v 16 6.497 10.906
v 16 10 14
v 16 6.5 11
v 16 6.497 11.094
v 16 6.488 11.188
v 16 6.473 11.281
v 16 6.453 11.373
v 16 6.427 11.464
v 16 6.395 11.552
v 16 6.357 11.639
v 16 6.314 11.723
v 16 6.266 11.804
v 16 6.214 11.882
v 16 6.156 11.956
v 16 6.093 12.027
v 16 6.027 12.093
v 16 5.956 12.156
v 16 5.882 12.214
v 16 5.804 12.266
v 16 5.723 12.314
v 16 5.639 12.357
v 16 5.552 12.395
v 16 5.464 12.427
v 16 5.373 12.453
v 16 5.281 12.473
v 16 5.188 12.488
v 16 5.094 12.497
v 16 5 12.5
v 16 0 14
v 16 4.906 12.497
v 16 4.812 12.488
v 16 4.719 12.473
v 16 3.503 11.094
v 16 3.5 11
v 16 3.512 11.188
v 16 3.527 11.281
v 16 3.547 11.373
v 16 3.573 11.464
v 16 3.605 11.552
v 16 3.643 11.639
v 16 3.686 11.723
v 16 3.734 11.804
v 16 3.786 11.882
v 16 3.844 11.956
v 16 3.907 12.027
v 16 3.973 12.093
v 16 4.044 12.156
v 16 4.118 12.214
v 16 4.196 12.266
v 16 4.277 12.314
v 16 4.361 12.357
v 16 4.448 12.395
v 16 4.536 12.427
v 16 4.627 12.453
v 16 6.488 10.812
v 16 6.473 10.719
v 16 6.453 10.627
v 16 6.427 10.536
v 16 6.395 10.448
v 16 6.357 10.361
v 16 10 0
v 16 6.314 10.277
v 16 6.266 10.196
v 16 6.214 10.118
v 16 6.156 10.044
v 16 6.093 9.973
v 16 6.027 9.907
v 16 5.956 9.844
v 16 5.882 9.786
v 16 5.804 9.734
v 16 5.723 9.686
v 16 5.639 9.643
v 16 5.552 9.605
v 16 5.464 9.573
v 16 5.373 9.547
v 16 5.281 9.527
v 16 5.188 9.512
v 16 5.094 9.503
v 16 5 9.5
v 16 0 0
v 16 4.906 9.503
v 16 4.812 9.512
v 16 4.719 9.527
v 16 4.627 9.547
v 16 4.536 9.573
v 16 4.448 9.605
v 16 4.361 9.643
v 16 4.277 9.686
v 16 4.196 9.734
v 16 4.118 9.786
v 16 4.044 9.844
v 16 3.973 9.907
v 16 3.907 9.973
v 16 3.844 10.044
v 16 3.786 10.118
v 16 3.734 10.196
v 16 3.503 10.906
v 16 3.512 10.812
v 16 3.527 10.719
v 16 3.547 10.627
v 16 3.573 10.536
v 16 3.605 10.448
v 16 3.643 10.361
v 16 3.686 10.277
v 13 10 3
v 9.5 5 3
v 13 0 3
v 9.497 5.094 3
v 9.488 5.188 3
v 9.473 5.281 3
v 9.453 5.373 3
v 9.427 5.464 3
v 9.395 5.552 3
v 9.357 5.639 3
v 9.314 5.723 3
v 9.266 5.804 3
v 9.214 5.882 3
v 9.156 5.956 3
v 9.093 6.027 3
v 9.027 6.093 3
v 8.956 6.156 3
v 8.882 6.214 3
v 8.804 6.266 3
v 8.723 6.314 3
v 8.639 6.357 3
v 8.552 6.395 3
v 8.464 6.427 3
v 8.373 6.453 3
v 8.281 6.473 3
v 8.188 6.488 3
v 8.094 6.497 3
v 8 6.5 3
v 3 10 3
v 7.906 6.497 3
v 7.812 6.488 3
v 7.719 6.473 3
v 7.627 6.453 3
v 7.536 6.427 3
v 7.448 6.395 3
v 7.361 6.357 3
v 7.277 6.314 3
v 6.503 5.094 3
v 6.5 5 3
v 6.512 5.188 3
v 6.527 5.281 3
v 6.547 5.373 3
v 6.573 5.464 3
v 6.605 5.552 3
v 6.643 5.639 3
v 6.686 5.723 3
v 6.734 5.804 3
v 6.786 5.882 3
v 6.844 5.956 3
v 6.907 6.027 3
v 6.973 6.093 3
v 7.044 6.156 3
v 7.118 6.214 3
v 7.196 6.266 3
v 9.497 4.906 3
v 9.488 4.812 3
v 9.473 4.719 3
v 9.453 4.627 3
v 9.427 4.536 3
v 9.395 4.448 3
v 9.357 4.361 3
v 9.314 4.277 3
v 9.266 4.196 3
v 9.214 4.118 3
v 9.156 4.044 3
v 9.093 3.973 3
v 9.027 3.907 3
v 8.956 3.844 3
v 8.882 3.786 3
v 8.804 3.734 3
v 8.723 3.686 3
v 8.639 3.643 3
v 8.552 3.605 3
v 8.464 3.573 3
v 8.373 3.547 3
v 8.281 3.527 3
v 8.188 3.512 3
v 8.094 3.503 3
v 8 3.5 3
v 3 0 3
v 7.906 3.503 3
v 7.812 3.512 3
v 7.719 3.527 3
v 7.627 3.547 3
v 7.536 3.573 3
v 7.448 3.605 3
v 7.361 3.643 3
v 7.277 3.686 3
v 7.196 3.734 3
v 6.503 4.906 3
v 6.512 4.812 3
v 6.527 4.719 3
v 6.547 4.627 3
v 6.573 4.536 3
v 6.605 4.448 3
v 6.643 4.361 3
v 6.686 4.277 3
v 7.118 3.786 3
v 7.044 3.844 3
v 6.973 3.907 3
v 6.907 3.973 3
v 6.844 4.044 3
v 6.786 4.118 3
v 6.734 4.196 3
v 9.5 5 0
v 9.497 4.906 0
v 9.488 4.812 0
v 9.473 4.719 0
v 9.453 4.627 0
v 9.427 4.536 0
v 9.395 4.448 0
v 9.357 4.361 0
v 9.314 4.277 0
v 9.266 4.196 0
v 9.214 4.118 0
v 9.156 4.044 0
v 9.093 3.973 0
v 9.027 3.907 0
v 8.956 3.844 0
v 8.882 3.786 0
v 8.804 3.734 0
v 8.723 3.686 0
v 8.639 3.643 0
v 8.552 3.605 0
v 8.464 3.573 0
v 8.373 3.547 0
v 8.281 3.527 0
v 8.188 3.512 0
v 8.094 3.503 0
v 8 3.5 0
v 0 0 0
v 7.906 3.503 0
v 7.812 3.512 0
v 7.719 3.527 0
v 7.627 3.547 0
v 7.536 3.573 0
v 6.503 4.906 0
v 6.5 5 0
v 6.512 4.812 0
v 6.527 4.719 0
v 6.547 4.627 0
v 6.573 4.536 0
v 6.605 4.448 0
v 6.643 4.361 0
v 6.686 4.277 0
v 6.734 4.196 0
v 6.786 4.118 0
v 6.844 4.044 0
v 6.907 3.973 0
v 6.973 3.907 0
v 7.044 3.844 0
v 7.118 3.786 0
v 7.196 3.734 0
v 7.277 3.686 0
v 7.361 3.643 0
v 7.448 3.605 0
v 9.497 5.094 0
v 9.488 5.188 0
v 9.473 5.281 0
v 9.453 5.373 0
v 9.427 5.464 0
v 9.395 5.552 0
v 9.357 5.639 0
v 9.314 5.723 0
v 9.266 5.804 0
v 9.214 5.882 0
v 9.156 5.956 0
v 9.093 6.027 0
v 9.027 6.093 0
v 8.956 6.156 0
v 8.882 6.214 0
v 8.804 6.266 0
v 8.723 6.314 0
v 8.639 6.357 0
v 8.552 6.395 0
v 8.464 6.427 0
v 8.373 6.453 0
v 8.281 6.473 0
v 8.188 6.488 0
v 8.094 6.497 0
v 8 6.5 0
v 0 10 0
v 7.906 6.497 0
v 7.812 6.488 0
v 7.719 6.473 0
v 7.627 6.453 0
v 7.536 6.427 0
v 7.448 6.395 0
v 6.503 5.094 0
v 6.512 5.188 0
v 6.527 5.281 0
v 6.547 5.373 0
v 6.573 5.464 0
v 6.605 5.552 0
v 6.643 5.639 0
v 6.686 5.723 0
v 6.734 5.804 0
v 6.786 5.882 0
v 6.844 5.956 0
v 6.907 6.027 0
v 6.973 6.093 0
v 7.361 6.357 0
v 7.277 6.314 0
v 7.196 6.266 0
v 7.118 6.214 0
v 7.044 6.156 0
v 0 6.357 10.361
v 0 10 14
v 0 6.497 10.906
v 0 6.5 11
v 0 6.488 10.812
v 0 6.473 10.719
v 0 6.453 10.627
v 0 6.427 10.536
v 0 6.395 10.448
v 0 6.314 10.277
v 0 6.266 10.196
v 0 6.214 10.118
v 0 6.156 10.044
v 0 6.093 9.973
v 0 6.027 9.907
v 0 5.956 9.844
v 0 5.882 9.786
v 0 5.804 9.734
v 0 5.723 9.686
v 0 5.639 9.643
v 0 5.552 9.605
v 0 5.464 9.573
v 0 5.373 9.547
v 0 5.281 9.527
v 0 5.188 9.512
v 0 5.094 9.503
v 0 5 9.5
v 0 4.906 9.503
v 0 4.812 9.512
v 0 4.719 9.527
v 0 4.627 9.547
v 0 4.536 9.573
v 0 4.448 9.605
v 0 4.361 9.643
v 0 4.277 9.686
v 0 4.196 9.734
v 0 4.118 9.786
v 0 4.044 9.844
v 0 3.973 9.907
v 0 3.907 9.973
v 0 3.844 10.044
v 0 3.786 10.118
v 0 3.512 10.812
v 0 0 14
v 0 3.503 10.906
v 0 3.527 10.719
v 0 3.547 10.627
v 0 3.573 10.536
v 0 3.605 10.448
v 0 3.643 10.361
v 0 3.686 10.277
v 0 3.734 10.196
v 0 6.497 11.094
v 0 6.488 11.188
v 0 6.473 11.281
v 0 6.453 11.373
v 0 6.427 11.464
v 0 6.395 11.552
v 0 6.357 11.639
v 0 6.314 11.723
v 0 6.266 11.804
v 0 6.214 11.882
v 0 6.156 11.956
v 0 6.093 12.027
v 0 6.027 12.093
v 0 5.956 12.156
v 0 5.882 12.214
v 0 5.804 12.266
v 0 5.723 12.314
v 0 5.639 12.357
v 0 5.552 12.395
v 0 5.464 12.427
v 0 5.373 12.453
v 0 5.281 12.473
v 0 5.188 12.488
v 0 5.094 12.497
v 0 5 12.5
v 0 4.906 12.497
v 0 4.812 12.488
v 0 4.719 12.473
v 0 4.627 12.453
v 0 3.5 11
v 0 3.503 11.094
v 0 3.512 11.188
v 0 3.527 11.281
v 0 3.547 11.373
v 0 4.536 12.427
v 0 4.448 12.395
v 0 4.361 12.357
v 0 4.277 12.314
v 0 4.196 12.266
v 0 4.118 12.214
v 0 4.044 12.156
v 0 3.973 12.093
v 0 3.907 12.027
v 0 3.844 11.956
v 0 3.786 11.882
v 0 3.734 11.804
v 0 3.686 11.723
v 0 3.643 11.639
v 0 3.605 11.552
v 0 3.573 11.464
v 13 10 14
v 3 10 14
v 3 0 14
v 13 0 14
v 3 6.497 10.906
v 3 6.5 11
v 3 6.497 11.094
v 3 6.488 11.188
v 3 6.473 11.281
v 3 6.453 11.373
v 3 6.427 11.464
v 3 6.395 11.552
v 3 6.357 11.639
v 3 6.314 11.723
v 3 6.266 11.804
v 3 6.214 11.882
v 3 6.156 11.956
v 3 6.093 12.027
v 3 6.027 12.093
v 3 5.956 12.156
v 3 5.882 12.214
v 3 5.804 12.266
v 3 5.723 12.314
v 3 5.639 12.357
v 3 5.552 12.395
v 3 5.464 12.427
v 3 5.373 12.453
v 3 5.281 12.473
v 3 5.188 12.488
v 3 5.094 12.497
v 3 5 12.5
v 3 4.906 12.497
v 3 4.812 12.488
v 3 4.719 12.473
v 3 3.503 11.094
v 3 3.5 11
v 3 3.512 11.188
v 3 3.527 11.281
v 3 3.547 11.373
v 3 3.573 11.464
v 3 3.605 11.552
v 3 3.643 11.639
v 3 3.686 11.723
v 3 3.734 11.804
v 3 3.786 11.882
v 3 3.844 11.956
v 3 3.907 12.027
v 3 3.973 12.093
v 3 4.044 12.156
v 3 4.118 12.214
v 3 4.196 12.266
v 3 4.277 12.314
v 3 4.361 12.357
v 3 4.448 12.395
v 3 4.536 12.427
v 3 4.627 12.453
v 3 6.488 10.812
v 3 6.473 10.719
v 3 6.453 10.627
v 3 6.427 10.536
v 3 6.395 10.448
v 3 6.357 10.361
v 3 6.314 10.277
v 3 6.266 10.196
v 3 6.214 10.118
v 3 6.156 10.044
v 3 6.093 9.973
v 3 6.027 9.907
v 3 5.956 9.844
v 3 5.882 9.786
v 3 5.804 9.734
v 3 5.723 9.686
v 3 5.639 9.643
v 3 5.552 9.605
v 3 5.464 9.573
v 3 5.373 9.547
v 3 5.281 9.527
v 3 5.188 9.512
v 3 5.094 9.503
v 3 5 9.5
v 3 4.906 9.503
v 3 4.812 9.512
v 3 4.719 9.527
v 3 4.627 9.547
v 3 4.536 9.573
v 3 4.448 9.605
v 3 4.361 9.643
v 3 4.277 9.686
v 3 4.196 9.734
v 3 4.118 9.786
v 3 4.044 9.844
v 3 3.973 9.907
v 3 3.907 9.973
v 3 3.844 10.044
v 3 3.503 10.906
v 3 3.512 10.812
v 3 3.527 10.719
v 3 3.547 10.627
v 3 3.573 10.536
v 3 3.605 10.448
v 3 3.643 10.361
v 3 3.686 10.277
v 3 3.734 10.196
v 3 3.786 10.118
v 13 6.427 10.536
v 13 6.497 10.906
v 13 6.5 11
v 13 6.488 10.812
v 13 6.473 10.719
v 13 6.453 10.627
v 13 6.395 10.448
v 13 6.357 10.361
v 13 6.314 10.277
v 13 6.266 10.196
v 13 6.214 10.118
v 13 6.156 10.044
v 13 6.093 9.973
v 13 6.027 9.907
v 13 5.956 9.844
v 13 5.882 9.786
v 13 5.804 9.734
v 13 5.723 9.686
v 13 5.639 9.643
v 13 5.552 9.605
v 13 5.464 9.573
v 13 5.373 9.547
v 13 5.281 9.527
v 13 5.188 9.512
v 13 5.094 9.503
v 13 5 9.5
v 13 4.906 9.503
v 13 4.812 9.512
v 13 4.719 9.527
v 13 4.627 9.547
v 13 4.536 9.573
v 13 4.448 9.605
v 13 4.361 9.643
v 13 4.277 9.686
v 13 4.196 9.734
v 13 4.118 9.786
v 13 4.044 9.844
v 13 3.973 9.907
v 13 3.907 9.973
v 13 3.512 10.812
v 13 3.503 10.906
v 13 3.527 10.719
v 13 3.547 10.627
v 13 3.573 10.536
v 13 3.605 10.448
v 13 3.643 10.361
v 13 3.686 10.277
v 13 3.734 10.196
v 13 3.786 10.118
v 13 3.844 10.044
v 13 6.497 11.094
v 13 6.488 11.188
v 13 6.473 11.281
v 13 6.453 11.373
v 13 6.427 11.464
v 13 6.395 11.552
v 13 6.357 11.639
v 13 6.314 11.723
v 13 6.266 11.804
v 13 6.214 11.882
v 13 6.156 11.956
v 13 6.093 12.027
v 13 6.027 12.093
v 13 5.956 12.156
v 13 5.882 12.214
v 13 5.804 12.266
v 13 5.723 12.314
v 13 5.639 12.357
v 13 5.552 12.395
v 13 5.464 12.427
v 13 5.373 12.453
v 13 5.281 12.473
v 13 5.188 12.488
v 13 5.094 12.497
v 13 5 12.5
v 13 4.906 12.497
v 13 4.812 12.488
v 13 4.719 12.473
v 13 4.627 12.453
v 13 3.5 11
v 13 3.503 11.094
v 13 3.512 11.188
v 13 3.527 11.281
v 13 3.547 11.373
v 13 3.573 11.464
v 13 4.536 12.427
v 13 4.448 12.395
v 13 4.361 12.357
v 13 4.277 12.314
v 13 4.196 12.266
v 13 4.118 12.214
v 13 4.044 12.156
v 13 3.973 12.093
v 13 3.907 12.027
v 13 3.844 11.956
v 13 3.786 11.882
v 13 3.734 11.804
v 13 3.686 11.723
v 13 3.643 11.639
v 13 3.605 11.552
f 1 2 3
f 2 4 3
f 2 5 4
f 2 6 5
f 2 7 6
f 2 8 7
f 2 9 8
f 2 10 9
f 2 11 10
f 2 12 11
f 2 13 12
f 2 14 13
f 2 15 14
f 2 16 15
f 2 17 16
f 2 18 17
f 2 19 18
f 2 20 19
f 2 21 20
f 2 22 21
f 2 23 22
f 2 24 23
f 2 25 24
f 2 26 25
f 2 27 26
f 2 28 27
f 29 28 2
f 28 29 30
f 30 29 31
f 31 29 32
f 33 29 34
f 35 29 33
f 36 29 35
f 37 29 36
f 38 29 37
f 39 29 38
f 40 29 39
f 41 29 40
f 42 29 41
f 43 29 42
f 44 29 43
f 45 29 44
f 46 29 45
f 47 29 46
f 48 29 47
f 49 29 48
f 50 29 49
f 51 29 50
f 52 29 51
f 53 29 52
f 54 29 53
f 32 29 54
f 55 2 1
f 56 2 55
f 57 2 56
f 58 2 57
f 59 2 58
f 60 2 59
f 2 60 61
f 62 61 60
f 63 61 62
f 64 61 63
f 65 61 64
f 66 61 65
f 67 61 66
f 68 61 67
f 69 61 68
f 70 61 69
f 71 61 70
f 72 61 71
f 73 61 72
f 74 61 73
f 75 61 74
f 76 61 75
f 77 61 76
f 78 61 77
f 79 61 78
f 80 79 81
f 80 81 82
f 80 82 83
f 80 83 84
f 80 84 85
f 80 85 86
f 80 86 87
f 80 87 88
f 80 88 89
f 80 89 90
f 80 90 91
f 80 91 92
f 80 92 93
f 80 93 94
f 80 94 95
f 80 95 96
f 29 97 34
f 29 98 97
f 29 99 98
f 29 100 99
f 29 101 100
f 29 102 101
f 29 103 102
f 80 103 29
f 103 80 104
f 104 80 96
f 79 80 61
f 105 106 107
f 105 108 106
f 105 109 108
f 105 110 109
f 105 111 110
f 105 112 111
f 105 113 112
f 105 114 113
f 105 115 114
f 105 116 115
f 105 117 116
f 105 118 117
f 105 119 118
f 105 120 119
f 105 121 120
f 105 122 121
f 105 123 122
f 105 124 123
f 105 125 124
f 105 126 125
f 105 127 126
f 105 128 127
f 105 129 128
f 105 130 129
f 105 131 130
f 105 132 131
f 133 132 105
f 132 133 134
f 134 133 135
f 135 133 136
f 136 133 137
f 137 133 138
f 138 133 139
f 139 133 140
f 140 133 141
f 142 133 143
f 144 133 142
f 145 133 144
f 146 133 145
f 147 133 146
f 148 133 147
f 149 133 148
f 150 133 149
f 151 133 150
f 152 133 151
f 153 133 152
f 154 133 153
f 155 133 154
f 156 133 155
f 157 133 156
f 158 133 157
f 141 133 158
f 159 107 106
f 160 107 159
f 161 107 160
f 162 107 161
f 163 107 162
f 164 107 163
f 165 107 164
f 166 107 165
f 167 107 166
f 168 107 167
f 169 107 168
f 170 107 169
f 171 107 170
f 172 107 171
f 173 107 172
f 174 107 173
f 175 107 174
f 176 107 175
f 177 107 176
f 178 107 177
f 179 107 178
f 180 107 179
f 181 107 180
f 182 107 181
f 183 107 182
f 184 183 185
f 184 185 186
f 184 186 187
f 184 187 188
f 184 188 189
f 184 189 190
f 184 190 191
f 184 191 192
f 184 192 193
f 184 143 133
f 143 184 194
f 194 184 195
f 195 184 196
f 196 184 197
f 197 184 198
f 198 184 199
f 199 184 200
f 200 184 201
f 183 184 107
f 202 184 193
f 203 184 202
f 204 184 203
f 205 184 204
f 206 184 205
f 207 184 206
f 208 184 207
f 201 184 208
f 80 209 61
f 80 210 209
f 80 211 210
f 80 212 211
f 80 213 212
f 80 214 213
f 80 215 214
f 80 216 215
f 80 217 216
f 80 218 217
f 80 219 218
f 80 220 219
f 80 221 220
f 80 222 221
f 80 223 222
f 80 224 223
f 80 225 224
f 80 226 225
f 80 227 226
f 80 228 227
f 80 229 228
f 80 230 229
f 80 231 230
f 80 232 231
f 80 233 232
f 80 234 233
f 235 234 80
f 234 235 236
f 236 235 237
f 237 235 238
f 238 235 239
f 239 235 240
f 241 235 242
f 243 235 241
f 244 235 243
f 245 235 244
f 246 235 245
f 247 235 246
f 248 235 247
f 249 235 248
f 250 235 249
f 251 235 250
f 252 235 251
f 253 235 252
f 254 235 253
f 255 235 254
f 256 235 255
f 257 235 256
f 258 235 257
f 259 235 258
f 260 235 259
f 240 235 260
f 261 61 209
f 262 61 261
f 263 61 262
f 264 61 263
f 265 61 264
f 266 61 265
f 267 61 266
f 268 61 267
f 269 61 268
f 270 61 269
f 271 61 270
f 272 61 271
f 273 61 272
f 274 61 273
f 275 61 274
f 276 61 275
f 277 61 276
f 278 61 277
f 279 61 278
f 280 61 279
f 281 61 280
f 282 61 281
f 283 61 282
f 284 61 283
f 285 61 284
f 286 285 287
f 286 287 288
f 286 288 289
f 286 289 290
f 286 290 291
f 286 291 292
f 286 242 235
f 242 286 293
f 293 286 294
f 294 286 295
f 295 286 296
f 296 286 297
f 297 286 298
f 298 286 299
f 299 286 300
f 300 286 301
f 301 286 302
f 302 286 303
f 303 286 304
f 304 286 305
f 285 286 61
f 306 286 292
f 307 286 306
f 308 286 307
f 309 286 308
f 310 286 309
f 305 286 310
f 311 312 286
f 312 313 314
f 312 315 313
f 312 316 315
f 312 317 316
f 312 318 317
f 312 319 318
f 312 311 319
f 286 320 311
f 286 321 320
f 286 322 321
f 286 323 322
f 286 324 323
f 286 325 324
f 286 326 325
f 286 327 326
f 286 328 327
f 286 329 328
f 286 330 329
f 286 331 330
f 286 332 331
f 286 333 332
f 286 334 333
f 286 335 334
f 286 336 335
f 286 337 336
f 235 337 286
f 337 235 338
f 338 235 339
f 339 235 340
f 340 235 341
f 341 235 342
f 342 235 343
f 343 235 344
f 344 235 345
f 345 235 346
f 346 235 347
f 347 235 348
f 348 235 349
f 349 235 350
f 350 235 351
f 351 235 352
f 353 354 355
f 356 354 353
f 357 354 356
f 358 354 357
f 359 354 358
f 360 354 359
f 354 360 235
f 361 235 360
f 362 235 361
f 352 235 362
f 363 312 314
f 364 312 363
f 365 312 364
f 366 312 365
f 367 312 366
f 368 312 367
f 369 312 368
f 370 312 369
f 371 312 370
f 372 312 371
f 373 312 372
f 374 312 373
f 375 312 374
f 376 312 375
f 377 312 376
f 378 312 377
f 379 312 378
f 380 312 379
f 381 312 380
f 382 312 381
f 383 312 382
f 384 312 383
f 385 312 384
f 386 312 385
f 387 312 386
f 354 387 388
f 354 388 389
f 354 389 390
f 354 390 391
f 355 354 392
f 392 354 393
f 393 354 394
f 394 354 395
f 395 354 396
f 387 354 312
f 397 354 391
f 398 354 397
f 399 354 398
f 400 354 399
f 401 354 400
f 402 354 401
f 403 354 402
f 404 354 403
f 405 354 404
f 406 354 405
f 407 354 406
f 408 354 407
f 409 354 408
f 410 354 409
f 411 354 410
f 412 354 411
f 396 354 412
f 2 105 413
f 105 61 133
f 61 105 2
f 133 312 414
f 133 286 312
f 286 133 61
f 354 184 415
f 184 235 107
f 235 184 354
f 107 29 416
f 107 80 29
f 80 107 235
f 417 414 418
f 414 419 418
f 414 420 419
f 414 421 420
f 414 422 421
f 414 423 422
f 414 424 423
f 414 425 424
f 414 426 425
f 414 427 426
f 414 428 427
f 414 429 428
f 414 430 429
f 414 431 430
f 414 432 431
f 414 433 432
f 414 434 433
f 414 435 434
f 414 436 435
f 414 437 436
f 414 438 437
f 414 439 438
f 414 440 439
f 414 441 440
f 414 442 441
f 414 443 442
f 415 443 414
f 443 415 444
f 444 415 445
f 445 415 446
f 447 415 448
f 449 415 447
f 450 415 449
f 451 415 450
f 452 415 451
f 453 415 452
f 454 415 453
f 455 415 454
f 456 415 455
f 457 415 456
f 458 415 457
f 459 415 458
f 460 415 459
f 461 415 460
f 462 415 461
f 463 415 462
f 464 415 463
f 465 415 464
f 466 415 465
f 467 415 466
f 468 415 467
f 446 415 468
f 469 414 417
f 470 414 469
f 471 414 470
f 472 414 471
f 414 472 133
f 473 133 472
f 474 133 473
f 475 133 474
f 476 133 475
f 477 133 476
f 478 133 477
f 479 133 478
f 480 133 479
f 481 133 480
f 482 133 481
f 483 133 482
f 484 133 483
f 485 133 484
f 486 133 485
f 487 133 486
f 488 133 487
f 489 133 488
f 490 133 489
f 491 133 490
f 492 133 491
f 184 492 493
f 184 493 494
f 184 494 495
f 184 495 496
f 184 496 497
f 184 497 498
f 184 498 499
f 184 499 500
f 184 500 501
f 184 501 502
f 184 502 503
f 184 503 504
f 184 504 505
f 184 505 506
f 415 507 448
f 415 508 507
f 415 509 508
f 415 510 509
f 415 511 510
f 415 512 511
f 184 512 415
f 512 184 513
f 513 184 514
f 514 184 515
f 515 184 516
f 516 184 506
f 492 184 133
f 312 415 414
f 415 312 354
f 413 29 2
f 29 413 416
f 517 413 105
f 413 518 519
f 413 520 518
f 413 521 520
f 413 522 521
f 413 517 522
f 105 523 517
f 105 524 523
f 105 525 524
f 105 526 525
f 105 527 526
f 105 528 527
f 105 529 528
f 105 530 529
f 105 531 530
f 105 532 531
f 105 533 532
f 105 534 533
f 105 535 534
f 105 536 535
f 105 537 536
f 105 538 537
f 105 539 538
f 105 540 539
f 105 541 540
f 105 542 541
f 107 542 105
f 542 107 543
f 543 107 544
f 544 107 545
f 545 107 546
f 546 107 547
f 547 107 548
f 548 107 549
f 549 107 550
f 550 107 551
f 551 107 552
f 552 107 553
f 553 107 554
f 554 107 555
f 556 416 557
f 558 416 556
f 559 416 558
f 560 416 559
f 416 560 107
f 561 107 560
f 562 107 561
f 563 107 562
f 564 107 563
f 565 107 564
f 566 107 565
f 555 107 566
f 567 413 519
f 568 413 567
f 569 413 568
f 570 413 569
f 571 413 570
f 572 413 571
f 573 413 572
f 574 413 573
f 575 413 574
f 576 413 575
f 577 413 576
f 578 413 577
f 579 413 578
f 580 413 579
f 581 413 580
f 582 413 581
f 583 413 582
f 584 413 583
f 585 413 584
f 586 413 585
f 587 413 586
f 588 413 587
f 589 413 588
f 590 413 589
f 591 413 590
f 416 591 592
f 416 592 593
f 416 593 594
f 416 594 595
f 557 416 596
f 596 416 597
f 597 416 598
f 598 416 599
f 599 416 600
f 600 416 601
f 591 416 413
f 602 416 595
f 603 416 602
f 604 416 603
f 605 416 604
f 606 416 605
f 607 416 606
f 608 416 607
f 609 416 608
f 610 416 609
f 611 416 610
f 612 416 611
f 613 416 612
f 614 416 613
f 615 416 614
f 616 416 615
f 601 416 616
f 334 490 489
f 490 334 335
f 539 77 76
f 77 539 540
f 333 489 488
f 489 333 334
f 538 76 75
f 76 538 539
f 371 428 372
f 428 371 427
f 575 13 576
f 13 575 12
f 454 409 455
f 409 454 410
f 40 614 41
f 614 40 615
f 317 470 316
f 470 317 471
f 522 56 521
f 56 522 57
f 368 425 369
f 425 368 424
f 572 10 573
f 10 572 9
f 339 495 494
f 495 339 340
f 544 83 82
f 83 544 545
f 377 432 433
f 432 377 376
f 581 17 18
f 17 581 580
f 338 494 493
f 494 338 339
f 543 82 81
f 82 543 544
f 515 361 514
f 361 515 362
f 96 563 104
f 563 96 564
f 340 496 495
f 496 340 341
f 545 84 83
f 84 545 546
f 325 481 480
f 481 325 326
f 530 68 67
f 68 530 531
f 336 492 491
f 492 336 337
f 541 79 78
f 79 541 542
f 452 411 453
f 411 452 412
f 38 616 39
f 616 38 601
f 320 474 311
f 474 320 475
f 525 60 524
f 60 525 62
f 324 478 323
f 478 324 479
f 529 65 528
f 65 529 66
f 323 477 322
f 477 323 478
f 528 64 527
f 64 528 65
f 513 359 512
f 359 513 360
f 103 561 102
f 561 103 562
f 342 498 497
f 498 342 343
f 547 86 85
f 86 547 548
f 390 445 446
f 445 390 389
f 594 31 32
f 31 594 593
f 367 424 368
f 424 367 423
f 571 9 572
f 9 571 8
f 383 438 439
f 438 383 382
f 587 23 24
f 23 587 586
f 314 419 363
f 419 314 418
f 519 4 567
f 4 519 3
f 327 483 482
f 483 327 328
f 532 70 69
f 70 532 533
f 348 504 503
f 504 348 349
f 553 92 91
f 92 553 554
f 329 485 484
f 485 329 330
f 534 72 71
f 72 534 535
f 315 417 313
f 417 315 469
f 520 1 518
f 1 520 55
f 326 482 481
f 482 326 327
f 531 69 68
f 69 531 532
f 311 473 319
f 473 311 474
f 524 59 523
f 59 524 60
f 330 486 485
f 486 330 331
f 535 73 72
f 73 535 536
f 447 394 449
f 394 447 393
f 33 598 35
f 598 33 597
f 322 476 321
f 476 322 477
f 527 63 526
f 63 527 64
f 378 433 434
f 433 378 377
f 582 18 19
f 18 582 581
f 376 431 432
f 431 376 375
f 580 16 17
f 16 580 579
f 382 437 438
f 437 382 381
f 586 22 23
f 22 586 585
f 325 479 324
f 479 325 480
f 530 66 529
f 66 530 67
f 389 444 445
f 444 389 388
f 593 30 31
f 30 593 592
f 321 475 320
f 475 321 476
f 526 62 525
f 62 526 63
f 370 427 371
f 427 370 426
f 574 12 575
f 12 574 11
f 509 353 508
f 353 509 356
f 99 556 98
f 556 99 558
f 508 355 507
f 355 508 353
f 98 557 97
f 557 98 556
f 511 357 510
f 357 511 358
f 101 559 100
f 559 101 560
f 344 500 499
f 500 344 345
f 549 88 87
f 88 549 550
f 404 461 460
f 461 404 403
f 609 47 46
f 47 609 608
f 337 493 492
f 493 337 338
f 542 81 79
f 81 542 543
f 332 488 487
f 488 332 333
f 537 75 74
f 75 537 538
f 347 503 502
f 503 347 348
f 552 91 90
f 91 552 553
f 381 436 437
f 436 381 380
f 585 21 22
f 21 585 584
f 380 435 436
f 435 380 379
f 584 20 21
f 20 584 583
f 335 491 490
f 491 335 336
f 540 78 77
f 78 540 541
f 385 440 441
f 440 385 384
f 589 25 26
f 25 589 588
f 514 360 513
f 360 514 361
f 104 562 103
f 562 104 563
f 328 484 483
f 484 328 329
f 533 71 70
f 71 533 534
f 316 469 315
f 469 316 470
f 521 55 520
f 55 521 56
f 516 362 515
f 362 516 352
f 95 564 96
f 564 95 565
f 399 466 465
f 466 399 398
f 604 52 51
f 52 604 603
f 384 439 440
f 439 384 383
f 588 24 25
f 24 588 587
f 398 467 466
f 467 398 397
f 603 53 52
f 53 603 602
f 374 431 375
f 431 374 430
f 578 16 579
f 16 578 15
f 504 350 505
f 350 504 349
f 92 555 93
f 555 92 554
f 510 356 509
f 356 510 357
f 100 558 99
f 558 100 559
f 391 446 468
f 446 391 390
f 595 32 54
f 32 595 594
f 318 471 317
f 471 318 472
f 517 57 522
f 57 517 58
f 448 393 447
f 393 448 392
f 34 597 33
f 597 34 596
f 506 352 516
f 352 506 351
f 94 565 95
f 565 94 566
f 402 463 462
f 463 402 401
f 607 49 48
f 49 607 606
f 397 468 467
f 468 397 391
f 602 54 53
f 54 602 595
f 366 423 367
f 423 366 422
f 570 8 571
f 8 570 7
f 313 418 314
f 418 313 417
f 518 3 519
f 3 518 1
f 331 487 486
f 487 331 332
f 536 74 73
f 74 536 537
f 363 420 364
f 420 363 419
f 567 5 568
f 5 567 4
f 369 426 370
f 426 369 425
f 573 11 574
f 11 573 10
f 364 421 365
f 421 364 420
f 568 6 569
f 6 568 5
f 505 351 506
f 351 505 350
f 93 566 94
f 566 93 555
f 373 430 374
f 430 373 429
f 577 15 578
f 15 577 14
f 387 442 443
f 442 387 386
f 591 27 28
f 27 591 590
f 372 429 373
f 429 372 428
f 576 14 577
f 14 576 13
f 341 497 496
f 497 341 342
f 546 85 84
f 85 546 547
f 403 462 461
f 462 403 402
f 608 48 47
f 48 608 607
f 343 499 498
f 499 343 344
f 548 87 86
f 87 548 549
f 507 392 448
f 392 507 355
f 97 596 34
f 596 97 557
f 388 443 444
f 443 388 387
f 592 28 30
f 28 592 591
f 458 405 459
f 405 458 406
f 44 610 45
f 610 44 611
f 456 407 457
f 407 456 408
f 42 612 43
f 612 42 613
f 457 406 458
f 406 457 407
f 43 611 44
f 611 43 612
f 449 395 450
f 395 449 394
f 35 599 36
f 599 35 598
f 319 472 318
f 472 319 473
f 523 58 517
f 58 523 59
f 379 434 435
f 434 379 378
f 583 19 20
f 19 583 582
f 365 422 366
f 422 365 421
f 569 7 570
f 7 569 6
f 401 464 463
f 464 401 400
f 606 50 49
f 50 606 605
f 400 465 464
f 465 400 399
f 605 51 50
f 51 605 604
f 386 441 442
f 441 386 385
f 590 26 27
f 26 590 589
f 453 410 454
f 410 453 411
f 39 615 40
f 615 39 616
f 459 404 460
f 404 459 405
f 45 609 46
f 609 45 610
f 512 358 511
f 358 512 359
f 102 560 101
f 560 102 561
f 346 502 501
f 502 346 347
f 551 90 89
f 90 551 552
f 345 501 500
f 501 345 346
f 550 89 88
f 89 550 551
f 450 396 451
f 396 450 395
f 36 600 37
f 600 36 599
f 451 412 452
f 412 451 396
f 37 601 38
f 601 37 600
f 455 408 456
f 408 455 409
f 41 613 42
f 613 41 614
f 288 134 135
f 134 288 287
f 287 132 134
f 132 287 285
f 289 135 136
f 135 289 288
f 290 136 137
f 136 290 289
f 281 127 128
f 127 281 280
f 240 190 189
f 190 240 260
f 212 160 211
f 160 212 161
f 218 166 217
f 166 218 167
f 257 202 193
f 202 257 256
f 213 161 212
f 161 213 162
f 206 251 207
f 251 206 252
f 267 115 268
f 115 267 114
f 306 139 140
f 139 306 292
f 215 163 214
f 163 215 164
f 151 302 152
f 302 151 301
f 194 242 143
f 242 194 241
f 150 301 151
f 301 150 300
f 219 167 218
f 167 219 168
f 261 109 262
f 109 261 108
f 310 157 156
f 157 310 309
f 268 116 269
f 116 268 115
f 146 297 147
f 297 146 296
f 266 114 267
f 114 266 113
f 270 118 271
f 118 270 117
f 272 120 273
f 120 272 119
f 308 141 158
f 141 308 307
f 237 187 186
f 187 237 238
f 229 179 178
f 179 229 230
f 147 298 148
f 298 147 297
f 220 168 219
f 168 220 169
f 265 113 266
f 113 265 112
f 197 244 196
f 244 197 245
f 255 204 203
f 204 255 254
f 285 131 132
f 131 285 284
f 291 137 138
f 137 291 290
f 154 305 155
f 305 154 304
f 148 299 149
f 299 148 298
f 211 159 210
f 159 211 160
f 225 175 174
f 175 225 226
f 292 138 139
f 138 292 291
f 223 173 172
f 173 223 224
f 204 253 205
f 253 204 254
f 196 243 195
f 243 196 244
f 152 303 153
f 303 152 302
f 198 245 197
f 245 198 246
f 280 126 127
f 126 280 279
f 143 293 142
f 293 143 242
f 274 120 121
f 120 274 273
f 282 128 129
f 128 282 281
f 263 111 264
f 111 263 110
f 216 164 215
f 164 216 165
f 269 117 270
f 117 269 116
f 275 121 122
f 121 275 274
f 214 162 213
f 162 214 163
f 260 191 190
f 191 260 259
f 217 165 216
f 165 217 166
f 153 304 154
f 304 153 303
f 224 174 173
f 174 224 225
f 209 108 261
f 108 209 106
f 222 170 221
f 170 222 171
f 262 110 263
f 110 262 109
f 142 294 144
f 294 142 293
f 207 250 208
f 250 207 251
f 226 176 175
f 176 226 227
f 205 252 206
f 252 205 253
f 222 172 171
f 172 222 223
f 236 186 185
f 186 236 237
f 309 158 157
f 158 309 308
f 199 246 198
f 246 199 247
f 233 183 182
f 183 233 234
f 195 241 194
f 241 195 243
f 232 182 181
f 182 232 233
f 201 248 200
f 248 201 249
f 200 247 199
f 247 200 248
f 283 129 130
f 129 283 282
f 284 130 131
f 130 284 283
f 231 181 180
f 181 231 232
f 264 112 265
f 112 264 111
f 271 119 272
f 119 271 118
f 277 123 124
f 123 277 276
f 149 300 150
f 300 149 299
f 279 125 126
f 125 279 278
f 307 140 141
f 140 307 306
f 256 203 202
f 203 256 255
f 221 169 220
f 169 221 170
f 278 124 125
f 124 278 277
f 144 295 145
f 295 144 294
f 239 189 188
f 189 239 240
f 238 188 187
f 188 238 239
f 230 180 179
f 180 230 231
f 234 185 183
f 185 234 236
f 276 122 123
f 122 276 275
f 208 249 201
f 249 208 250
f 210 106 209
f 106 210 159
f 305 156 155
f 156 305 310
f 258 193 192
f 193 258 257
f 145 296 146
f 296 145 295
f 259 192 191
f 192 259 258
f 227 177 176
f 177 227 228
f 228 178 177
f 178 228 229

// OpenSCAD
difference(){
	union(){ 

        translate([0,0,0]){
           cube([16,10,3], center=false);
        }                
        translate([0,0,0]){
           cube([3,10,14], center=false);
        }                
        translate([13,0,0]){
           cube([3,10,14], center=false);
        }                
	}
	union() {

        translate([0,5,11]){
            rotate([0,90,0]){
                cylinder(h=200, r=1.5, $fn=100, center=true);
            }   
        }
        translate([8,5,0]){
            rotate([0,0,90]){
                cylinder(h=200, r=1.5, $fn=100, center=true);
            }   
        }

	}
}
